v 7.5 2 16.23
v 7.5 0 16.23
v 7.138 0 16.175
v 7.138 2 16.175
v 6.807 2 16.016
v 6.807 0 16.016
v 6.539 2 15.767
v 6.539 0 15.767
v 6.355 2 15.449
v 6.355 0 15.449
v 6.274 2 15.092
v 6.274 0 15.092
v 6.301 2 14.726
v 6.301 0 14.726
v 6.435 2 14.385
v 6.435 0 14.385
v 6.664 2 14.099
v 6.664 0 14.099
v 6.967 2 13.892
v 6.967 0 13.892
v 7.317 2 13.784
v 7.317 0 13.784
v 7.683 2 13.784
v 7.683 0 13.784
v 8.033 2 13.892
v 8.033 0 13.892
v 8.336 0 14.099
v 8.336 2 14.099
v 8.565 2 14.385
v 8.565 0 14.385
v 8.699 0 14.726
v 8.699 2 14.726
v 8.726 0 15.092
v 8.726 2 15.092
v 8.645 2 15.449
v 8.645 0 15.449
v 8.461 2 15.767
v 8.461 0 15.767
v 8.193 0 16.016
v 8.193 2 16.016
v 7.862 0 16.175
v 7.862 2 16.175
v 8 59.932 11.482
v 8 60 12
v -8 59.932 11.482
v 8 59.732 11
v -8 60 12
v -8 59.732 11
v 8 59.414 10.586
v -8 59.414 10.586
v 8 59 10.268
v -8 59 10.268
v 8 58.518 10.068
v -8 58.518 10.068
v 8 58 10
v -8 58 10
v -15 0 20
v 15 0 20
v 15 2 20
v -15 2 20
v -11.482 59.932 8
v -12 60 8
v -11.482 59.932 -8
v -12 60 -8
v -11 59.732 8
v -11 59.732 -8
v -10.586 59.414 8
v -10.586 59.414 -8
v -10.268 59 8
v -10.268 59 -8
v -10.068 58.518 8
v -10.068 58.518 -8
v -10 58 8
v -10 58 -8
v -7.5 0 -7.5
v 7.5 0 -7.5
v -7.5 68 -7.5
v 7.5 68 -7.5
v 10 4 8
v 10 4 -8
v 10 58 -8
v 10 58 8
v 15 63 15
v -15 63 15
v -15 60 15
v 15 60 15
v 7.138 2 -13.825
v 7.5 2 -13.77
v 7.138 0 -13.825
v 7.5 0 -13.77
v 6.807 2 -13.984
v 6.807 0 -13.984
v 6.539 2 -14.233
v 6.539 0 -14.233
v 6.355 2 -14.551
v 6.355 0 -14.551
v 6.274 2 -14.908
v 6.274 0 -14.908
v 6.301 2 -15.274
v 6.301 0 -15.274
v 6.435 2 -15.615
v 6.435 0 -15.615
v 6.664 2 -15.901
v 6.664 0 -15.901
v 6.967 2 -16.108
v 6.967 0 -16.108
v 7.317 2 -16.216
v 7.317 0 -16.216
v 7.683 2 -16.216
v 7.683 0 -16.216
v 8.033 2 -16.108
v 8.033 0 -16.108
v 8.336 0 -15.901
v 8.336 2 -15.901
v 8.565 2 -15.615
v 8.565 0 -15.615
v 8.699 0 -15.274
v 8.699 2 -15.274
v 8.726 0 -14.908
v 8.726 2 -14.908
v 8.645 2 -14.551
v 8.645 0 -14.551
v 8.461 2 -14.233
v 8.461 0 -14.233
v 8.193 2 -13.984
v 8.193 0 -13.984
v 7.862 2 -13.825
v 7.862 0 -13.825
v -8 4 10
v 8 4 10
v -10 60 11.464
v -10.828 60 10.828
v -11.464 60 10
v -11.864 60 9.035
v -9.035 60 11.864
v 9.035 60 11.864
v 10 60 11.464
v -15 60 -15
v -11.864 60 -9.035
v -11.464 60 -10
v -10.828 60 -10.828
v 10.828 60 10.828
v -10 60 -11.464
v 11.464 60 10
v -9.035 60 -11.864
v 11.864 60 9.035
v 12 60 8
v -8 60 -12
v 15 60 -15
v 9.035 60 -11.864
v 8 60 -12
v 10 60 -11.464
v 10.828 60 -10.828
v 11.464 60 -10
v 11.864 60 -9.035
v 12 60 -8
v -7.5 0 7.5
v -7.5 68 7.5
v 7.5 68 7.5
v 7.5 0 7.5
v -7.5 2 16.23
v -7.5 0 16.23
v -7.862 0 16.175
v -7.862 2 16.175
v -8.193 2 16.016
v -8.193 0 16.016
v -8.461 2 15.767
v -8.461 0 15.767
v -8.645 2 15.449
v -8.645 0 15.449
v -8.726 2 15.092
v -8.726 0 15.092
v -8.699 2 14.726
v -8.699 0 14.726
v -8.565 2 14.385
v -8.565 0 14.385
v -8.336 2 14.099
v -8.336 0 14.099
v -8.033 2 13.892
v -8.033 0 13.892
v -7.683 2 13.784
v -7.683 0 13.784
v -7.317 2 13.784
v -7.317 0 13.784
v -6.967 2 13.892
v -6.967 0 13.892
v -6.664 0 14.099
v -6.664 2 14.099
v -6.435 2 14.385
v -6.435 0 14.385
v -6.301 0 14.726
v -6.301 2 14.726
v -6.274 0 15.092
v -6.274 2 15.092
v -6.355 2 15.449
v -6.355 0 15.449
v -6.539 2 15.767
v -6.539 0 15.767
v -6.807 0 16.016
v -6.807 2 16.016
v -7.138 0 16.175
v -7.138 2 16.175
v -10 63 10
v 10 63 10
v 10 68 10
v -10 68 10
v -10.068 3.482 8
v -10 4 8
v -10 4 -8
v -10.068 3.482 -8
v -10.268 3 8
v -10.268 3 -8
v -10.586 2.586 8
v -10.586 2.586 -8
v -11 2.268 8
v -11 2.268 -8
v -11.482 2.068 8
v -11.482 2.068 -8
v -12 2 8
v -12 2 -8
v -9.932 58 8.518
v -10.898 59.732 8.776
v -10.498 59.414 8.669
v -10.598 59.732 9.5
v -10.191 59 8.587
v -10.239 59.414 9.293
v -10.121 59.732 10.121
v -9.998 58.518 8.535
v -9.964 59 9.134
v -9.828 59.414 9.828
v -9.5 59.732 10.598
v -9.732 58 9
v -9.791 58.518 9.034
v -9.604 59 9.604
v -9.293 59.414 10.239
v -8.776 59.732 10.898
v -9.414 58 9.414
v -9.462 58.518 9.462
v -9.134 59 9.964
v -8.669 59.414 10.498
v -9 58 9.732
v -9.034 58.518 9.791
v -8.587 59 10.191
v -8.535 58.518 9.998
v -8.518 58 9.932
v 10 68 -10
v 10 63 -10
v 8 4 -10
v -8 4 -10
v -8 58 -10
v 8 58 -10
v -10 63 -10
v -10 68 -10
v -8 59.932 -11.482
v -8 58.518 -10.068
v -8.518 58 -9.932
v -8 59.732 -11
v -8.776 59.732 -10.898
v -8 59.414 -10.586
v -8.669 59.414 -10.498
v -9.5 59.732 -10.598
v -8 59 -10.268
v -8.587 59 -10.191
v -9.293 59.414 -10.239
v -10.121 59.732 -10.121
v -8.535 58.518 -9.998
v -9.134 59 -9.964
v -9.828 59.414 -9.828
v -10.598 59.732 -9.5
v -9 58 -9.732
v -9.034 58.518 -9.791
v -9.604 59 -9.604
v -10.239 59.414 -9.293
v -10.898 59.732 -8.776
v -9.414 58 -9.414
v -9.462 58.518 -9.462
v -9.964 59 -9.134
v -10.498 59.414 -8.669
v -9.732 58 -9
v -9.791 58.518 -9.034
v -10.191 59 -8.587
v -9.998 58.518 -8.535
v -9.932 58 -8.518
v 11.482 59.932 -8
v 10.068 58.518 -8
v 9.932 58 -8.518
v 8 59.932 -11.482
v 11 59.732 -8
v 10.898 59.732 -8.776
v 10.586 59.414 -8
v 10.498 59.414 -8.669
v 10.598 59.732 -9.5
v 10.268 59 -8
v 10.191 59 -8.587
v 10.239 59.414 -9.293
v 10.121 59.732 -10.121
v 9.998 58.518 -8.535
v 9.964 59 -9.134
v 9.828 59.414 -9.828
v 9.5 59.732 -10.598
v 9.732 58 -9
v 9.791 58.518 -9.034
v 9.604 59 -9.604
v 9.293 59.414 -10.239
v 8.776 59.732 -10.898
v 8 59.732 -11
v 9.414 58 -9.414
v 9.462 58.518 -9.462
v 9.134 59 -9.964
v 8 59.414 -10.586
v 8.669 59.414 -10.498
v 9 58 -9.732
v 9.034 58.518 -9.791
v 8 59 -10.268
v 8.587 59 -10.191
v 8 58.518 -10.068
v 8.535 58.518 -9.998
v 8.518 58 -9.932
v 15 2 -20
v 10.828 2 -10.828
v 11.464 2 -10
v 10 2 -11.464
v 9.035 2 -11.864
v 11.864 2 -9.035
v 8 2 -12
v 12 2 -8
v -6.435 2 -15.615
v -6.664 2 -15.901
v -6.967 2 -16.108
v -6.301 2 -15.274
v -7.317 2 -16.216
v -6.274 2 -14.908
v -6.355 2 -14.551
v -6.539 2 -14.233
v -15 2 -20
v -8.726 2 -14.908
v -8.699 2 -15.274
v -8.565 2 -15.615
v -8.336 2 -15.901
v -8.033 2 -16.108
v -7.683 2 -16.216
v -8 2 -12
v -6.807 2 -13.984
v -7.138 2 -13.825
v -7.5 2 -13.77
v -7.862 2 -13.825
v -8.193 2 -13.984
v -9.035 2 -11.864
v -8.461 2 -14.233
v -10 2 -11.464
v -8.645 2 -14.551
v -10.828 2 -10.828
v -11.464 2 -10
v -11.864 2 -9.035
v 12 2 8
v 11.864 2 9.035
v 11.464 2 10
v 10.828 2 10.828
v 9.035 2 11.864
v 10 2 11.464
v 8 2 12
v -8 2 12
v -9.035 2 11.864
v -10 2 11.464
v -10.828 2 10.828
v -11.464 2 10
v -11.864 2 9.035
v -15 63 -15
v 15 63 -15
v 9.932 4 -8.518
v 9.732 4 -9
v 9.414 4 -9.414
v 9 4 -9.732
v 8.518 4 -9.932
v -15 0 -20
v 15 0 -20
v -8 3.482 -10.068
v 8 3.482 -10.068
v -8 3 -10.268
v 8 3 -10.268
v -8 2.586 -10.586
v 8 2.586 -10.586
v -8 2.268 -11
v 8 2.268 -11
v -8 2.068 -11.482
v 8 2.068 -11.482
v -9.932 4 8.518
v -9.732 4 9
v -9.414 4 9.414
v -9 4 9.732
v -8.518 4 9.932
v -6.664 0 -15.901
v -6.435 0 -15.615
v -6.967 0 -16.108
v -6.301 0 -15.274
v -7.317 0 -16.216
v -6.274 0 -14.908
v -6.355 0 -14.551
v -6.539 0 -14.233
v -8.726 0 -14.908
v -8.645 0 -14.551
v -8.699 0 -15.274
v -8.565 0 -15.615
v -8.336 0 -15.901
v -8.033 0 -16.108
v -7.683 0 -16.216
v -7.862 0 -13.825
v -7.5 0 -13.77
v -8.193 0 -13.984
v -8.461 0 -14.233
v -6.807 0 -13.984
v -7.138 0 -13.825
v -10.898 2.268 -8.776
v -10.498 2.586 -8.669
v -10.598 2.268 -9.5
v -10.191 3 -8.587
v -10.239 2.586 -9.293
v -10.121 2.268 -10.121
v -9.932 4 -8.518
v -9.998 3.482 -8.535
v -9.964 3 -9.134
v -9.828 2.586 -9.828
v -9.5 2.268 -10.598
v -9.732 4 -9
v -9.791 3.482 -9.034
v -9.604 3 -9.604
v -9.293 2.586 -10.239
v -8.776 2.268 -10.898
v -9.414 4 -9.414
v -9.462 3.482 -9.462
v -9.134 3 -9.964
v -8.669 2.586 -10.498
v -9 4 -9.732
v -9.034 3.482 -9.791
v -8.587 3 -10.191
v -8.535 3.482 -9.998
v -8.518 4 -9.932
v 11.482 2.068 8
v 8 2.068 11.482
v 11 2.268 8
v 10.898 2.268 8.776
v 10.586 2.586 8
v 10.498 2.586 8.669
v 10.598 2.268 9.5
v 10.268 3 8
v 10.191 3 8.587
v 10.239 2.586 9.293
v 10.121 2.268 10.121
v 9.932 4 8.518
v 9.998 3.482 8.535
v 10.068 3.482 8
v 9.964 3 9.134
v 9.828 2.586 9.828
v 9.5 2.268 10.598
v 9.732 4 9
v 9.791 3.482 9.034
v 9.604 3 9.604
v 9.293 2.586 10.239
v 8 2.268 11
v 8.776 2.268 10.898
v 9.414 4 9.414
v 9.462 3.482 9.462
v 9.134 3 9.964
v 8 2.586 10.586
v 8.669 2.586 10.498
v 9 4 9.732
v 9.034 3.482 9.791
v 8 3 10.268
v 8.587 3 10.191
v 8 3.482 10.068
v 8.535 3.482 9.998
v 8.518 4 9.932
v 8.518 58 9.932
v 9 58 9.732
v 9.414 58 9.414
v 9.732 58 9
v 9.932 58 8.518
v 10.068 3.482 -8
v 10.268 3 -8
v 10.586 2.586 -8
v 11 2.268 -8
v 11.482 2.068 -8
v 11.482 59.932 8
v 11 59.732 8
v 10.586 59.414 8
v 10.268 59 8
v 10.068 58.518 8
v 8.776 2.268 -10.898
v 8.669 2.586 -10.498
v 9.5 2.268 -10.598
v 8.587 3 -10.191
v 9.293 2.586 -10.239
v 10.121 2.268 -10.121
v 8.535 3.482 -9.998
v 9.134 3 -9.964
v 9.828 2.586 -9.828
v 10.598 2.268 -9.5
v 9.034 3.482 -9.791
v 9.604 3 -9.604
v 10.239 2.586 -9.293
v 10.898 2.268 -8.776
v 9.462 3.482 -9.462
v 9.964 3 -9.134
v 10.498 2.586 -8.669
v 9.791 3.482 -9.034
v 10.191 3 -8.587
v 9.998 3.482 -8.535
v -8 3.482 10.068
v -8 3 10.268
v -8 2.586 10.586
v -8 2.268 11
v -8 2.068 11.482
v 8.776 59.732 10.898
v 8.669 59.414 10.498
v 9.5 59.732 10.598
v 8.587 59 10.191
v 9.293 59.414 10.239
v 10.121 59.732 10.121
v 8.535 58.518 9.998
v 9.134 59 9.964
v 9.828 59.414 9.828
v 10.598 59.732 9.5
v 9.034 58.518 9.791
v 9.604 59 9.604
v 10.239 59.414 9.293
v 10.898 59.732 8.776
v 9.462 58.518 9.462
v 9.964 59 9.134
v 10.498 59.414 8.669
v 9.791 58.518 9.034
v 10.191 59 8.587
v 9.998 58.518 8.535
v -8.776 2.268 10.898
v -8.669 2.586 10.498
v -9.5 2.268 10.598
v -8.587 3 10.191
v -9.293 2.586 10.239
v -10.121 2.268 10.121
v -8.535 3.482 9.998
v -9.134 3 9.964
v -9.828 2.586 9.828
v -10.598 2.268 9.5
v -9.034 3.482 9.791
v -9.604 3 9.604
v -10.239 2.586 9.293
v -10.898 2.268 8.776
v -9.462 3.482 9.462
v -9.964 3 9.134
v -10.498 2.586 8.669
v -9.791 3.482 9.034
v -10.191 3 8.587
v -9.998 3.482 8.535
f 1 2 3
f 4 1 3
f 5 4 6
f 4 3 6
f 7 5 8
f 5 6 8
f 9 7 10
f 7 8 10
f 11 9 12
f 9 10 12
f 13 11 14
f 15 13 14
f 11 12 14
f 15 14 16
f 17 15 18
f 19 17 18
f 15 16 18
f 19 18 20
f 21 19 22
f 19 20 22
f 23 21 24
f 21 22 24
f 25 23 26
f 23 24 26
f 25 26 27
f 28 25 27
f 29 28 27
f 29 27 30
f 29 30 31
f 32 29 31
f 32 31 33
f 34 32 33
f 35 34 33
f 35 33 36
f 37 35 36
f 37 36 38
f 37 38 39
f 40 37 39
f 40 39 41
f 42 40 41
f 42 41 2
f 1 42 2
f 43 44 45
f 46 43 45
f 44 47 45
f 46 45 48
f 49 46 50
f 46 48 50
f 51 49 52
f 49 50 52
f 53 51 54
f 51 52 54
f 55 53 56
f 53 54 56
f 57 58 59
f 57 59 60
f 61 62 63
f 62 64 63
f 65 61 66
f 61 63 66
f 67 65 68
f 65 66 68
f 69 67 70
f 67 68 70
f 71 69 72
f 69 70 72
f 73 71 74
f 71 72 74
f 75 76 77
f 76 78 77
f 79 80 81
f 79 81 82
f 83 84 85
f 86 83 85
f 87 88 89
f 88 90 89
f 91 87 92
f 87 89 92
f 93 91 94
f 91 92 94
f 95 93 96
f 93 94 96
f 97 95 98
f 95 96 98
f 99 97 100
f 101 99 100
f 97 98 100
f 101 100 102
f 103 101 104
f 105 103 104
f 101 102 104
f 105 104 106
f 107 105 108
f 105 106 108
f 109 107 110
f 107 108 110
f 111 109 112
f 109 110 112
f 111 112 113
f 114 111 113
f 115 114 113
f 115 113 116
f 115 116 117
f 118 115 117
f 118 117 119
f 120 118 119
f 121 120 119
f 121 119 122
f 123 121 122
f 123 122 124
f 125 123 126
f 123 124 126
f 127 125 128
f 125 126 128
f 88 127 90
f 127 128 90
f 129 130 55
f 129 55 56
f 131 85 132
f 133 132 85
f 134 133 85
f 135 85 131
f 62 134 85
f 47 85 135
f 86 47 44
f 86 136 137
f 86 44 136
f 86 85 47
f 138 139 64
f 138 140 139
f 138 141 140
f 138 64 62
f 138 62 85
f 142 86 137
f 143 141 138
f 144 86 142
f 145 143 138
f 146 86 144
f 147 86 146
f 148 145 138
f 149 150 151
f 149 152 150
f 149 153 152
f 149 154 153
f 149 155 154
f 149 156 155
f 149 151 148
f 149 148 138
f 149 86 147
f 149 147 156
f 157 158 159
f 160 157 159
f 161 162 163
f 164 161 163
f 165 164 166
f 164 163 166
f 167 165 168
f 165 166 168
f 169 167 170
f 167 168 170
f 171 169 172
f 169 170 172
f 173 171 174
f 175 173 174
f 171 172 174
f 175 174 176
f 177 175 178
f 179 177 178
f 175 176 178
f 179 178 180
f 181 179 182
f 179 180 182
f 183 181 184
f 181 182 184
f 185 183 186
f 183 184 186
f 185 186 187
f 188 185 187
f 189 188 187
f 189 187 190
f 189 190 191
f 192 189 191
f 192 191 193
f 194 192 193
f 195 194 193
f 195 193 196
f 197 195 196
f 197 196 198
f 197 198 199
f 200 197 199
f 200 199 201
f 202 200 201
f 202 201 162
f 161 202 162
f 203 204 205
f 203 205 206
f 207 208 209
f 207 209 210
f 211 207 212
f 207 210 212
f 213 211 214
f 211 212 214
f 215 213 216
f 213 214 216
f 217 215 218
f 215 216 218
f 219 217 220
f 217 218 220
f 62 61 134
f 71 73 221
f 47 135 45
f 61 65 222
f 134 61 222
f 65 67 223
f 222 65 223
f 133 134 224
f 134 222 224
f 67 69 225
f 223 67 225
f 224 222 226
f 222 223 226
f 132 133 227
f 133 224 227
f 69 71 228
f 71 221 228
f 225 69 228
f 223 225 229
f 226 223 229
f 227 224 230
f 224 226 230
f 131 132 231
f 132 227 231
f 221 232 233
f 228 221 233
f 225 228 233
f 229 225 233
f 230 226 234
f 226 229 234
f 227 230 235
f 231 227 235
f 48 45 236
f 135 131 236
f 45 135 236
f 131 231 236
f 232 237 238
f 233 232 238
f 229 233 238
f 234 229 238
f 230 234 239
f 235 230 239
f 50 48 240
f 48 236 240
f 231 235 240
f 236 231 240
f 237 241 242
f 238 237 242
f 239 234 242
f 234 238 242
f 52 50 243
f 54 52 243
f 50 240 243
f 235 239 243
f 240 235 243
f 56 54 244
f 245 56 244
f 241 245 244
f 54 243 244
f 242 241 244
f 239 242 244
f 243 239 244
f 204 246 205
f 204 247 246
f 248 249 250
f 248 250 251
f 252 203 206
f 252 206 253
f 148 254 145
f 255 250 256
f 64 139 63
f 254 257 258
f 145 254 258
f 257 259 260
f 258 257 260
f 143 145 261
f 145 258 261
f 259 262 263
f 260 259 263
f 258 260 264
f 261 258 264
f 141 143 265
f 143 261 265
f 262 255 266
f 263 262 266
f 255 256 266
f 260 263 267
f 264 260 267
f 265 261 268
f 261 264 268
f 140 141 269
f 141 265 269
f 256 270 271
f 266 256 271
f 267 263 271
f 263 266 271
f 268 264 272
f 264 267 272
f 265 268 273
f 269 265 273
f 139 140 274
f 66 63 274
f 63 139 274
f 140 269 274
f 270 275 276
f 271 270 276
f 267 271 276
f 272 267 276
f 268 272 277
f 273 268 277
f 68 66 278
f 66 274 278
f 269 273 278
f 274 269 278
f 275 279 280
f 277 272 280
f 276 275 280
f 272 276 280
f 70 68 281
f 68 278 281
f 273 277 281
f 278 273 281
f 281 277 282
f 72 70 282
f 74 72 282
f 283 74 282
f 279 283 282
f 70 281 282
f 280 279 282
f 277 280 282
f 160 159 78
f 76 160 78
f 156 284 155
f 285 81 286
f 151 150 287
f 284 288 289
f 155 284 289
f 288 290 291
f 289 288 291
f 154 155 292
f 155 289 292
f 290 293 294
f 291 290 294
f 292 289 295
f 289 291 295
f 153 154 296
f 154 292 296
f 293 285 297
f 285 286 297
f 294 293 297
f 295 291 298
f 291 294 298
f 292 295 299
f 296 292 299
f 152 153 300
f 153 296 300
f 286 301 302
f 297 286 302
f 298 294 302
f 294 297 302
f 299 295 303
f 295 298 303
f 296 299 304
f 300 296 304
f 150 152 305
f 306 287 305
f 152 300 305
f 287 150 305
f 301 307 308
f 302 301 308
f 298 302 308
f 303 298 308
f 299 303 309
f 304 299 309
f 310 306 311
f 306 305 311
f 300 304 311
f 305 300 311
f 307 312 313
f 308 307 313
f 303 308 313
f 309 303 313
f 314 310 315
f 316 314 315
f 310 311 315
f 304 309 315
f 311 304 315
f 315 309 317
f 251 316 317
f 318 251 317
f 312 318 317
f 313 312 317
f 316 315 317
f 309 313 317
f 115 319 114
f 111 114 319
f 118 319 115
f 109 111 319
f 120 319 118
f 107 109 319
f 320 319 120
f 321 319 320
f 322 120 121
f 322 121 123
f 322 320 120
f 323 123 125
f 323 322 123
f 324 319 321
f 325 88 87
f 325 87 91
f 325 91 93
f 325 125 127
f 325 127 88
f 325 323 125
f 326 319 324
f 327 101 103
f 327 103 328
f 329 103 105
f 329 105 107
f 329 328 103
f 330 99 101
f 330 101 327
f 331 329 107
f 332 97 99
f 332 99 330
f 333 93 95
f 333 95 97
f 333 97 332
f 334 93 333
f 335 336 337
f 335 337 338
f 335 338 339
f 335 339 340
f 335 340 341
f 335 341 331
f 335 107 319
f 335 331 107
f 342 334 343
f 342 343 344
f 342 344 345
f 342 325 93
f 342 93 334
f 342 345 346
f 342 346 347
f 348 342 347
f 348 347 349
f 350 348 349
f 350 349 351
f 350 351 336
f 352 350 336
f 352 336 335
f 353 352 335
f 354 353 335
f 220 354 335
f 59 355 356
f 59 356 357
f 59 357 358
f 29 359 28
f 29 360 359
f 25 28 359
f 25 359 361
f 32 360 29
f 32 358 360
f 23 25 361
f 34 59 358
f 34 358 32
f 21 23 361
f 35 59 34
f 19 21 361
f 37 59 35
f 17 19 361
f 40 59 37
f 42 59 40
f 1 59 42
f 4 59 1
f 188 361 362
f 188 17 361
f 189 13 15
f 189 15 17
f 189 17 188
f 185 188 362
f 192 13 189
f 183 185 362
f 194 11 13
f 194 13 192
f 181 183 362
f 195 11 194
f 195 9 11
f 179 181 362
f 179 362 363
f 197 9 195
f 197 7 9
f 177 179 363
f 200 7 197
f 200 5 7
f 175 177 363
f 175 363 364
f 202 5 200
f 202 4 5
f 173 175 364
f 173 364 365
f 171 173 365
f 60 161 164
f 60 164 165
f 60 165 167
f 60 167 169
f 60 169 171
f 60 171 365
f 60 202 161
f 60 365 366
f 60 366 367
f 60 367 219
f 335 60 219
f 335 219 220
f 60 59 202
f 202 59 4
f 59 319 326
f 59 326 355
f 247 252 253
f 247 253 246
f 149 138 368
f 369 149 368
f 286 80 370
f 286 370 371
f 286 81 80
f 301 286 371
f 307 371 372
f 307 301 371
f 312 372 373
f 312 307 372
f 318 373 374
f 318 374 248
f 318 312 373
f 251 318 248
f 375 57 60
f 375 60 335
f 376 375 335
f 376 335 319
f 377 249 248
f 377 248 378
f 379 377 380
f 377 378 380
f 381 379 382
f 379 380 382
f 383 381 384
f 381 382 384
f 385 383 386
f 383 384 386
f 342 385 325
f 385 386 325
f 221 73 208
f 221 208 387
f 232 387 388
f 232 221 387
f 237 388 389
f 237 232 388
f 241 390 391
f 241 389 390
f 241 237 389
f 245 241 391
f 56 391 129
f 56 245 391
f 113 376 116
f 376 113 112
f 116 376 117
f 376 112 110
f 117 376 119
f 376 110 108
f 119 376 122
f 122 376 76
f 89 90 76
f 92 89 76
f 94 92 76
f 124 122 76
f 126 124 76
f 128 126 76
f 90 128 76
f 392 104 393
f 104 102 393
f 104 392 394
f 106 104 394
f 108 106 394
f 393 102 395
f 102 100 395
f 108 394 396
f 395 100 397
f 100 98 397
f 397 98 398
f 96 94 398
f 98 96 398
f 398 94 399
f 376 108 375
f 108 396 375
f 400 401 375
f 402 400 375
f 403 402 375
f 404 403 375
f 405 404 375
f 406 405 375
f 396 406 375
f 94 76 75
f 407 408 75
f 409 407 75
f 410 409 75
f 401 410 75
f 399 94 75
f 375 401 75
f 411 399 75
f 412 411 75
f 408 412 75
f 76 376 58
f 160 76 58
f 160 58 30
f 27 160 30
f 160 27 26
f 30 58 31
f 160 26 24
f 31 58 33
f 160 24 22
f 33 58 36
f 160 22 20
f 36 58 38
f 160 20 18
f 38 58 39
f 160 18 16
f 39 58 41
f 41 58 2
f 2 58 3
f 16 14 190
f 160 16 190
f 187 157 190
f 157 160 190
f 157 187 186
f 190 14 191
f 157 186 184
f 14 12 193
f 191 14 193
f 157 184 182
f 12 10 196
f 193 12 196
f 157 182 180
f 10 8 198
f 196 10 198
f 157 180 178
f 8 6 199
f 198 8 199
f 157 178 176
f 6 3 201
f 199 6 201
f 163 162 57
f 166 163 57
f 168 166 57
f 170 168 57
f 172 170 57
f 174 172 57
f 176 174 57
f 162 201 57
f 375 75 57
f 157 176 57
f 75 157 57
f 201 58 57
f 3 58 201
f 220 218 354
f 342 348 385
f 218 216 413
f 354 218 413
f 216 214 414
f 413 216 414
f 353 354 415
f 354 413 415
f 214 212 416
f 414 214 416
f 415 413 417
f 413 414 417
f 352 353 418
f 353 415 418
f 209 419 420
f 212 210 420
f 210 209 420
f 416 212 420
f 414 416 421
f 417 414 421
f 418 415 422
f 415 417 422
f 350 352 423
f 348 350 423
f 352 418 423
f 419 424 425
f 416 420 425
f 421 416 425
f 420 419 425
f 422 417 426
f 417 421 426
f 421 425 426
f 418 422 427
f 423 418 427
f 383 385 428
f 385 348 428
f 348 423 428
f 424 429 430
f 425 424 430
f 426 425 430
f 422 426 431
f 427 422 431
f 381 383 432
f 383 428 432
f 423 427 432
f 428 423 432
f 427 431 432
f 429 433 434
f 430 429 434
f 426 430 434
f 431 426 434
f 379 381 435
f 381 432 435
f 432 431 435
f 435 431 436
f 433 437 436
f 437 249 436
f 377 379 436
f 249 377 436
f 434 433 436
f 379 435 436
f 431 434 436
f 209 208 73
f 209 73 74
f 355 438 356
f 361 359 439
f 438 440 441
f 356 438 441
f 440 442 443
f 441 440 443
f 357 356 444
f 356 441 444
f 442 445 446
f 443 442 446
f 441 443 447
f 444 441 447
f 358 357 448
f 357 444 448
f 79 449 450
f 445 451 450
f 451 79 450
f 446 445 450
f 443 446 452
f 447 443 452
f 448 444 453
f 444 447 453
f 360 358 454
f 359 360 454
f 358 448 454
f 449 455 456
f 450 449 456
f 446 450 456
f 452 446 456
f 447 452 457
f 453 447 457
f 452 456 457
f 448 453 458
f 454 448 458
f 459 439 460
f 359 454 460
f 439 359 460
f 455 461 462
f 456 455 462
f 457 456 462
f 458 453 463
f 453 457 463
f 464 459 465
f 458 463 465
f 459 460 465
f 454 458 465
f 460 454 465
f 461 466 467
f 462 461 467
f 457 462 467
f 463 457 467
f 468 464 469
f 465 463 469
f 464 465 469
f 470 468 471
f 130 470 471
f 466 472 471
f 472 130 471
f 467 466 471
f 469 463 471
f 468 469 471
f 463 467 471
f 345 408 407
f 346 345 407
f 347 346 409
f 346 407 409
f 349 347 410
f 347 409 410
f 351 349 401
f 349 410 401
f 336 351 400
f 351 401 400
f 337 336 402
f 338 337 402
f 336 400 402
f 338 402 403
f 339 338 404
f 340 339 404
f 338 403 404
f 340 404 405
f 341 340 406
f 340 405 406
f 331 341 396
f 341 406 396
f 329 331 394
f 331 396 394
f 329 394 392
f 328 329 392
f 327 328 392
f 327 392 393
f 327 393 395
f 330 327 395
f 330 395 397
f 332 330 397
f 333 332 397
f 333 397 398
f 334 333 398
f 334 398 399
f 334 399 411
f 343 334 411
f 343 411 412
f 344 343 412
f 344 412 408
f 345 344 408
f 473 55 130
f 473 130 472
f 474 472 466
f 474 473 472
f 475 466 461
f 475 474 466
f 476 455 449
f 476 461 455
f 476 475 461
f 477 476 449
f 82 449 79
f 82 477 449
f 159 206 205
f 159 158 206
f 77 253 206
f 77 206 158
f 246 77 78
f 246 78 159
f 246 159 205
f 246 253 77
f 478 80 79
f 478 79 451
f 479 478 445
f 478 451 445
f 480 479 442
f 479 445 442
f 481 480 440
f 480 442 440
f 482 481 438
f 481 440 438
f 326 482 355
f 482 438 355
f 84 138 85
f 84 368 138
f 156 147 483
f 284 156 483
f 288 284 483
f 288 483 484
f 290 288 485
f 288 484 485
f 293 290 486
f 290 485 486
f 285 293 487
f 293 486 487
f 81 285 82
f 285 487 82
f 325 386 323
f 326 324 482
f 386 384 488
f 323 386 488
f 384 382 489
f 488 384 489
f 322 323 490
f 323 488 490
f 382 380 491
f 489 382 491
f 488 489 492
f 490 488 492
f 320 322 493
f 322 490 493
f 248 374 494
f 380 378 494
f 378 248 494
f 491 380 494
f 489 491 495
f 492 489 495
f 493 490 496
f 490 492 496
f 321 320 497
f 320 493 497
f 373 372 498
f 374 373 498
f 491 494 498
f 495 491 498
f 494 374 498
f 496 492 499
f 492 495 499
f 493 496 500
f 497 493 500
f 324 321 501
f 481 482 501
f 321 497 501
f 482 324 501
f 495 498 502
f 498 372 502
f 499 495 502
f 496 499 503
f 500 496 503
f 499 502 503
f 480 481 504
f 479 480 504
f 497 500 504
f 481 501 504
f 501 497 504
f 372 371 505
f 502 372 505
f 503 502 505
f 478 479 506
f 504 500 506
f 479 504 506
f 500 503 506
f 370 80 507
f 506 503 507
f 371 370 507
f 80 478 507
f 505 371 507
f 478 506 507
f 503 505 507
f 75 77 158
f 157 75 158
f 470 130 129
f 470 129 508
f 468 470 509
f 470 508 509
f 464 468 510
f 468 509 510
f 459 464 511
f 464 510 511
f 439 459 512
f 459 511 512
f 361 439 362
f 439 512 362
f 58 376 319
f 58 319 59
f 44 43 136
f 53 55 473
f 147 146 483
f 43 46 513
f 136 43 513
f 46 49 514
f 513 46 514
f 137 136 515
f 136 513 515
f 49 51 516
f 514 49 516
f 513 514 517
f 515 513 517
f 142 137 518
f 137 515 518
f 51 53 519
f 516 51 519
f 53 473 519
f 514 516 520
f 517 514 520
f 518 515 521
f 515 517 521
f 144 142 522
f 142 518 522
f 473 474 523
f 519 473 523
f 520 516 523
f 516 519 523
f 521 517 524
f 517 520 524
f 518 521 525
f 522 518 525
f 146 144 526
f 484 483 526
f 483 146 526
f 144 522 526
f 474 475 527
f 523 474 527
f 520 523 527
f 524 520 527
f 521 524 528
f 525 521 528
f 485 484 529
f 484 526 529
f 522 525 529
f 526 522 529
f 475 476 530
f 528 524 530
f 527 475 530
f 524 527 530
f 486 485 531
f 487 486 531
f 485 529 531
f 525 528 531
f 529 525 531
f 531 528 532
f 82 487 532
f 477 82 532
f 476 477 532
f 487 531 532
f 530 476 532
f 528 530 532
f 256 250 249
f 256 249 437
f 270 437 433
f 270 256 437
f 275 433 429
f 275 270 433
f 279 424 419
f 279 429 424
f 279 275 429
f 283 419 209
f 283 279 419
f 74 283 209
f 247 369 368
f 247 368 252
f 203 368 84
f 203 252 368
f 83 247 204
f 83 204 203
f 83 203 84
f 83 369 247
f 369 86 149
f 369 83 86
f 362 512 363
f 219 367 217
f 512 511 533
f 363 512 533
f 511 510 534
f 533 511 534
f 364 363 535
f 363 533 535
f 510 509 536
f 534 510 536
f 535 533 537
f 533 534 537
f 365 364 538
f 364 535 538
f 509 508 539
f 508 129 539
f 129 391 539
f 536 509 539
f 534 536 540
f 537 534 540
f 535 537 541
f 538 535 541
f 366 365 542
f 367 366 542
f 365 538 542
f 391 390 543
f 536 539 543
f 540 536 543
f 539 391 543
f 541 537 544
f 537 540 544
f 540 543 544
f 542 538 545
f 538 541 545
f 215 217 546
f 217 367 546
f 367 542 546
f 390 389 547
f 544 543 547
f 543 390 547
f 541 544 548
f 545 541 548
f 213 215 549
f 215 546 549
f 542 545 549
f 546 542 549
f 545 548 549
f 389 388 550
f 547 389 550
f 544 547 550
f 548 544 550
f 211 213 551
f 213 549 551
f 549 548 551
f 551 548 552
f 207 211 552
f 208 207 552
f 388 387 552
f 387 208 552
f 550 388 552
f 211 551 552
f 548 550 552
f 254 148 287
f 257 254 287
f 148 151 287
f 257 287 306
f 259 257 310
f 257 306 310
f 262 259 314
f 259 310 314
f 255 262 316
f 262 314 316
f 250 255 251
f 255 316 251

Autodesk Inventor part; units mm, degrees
ref_plane "YZ Plane" through (0, 0, 0) normal (1, 0, 0) x (0, 1, 0)
ref_plane "XZ Plane" through (0, 0, 0) normal (0, 1, 0) x (-1, 0, 0)
ref_plane "XY Plane" through (0, 0, 0) normal (0, 0, 1) x (1, 0, 0)
sketch "Esquisse1" plane through (0, 0, 0) normal (0, 1, 0) x (-1, 0, 0)
  line L0 (-15, 20) -> (15, 20)
  line L1 (15, 20) -> (15, -20)
  line L2 (15, -20) -> (-15, -20)
  line L3 (-15, -20) -> (-15, 20)
  line L4 (-15, 20) -> (15, -20) construction
  line L5 (15, 20) -> (-15, -20) construction
  point P0 (0, 0)
  dimension "d0" = 30
  dimension "d1" = 40
extrude "Extrusion1" add sketch "Esquisse1" along normal blind 2
sketch "Esquisse2" plane through (0, 2, 0) normal (0, 1, 0) x (1, 0, 0)
  line L0 (10, -10) -> (-10, -10)
  line L1 (-10, -10) -> (-10, 10)
  line L2 (-10, 10) -> (10, 10)
  line L3 (10, 10) -> (10, -10)
  line L4 (10, -10) -> (-10, 10) construction
  line L5 (-10, -10) -> (10, 10) construction
  point P0 (0, 0)
  dimension "d4" = 20
  dimension "d5" = 20
extrude "Extrusion2" add sketch "Esquisse2" along normal blind 66
sketch "Esquisse3" plane through (0, 68, 0) normal (0, 1, 0) x (1, 0, 0)
  line L0 (7.5, 7.5) -> (-7.5, 7.5)
  line L1 (-7.5, 7.5) -> (-7.5, -7.5)
  line L2 (-7.5, -7.5) -> (7.5, -7.5)
  line L3 (7.5, -7.5) -> (7.5, 7.5)
  line L4 (7.5, 7.5) -> (-7.5, -7.5) construction
  line L5 (-7.5, 7.5) -> (7.5, -7.5) construction
  point P0 (0, 0)
  dimension "d9" = 15
  dimension "d10" = 15
extrude "Extrusion3" cut sketch "Esquisse3" against normal through all
sketch "Esquisse4" plane through (0, 2, 0) normal (0, 1, 0) x (1, 0, 0)
  line L0 (0, 0) -> (0, -15)
  line L1 (0, -15) -> (-7.5, -15)
  line L2 (0, 0) -> (0, 15)
  line L3 (0, 15) -> (-7.5, 15)
  point P0 (7.5, -15)
  point P1 (7.5, 15)
  point P2 (7.5, 15)
  dimension "d13" = 15
  dimension "d14" = 7.5
  dimension "d15" = 15
  dimension "d16" = 7.5
hole "Perçage1" at (-7.5, 2, 15) at (7.5, 2, 15) at (-7.5, 2, -15) at (7.5, 2, -15) direction (0, -1, 0) diameter 2.459 end through all thread size "M3x0.5" class "6H" standard "ISO Metric profile"
sketch "Esquisse5" plane through (10, 2, -10) normal (0, 0, -1) x (-1, 0, 0)
  point P0 (10, -2)
sketch "Esquisse6" plane through (10, 2, -10) normal (0, 0, -1) x (-1, 0, 0)
  line L0 (0, 66) -> (20, 66) projected
  line L1 (0, 66) -> (0, 61)
  line L2 (0, 0) -> (0, 66) projected
  line L3 (20, 0) -> (20, 66) projected
  line L4 (0, 61) -> (20, 61)
  line L5 (20, 61) -> (20, 58)
  line L6 (20, 58) -> (0, 58)
  line L7 (0, 58) -> (0, 61)
  point P0 (10, -2)
  point P1 (0, 58)
  dimension "d24" = 5
  dimension "d25" = 3
extrude "Extrusion4" add sketch "Esquisse6" along normal blind 5 contours L4 L3 L6 L2
sketch "Esquisse7" plane through (-10, 2, 10) normal (0, 0, 1) x (1, 0, 0)
  line L0 (0, 66) -> (20, 66) projected
  line L1 (0, 66) -> (0, 61)
  line L2 (0, 0) -> (0, 66) projected
  line L3 (20, 0) -> (20, 58) projected
  line L4 (0, 61) -> (20, 61)
  line L5 (20, 61) -> (20, 58)
  line L6 (20, 58) -> (0, 58)
  line L7 (0, 58) -> (0, 61)
  point P0 (10, -2)
  point P1 (0, 58)
  dimension "d28" = 5
  dimension "d29" = 3
extrude "Extrusion5" add sketch "Esquisse7" along normal blind 5
sketch "Esquisse8" plane through (10, 2, 10) normal (1, 0, 0) x (0, 0, -1)
  line L0 (-5, 61) -> (-5, 58) projected
  line L1 (20, 58) -> (25, 58) projected
  line L2 (-5, 61) -> (25, 61)
  line L3 (25, 61) -> (25, 58)
  line L4 (25, 58) -> (-5, 58)
  line L5 (-5, 58) -> (-5, 61)
  point P0 (10, -2)
extrude "Extrusion6" add sketch "Esquisse8" along normal blind 5
sketch "Esquisse9" plane through (-10, 2, -10) normal (-1, 0, 0) x (0, 0, 1)
  line L0 (-5, 58) -> (-5, 61) projected
  line L1 (25, 61) -> (25, 58) projected
  line L2 (-5, 61) -> (25, 61)
  line L3 (25, 61) -> (25, 58)
  line L4 (25, 58) -> (-5, 58)
  line L5 (-5, 58) -> (-5, 61)
  point P0 (10, -2)
extrude "Extrusion7" add sketch "Esquisse9" along normal blind 5
fillet "Congé2" radius 2 8 edges at (10, 31, -10) (10, 31, 10) (10, 2, 0) (0, 2, -10) (-10, 31, -10) (-10, 2, 0) (-10, 31, 10) (0, 2, 10)
fillet "Congé3" radius 2 8 edges at (-9.4142, 60, -9.4142) (0, 60, -10) (9.4142, 60, -9.4142) (10, 60, 0) (9.4142, 60, 9.4142) (0, 60, 10) (-9.4142, 60, 9.4142) (-10, 60, 0)
properties part number "Bras caméra"
